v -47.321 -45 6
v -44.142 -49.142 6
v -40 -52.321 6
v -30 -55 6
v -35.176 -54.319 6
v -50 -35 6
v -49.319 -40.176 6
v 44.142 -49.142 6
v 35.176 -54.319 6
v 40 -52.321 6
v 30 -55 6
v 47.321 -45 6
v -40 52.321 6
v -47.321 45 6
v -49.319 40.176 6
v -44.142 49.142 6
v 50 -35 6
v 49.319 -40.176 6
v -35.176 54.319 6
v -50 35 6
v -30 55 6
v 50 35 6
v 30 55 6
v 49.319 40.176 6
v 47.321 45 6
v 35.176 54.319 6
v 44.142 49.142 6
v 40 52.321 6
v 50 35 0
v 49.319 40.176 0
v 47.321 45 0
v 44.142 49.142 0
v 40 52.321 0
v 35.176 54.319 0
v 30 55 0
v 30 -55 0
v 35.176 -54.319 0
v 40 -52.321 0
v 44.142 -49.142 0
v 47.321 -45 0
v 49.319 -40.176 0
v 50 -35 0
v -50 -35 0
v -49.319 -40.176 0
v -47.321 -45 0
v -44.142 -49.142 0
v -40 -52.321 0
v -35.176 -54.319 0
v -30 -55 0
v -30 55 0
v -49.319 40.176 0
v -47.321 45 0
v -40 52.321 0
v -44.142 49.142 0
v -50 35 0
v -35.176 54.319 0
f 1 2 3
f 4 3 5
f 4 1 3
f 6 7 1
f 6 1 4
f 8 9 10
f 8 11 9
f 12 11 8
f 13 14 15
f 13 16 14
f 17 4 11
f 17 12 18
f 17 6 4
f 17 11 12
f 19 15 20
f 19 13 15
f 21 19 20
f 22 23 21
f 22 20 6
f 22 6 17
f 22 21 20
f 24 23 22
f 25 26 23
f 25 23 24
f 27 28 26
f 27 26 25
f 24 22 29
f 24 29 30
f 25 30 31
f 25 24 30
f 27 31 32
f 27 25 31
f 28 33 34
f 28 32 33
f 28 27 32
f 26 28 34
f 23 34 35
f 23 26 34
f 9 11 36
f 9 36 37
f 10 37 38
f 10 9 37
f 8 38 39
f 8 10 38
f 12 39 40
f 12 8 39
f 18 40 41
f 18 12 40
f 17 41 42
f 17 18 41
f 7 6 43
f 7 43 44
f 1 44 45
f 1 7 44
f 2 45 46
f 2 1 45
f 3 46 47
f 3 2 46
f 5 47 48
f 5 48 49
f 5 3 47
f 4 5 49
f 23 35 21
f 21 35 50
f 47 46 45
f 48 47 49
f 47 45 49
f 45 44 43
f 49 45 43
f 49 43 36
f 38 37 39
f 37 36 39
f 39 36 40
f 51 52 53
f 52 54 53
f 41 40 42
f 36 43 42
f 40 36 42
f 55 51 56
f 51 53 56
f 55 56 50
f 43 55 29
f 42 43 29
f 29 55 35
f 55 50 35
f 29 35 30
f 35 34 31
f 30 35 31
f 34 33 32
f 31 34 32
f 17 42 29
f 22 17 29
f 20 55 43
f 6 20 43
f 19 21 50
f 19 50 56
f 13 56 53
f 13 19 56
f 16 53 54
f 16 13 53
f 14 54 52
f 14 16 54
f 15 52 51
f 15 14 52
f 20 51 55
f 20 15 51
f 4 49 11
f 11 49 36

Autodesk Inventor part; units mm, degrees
ref_plane "YZ Plane" through (0, 0, 0) normal (1, 0, 0) x (0, 1, 0)
ref_plane "XZ Plane" through (0, 0, 0) normal (0, 1, 0) x (-1, 0, 0)
ref_plane "XY Plane" through (0, 0, 0) normal (0, 0, 1) x (1, 0, 0)
sketch "Sketch1" plane through (0, 0, 0) normal (0, 0, 1) x (1, 0, 0)
  line L0 (-50, -55) -> (50, -55)
  line L1 (50, -55) -> (50, 55)
  line L2 (50, 55) -> (-50, 55)
  line L3 (-50, 55) -> (-50, -55)
  line L4 (-50, -55) -> (50, 55) construction
  line L5 (50, -55) -> (-50, 55) construction
  point P0 (0, 0)
  dimension "d0" = 100
  dimension "d1" = 110
extrude "Plate1" add sketch "Sketch1" along normal blind 6
fillet "Corner Round1" radius 20 4 edges at (50, -55, 3) (-50, -55, 3) (-50, 55, 3) (50, 55, 3)
sketch "Sketch5" plane through (0, 0, 6) normal (0, 0, 1) x (1, 0, 0)
  line L0 (50, 35) -> (50, -35) projected
  line L1 (50, 25) -> (-50, 25)
  line L2 (-50, -35) -> (-50, 35) projected
  line L3 (-30, 55) -> (30, 55) projected
  point P0 (0, 0)
  dimension "d23" = 30
feature "Fold1" [suppressed]
equation "\"d2\" = Thickness"
equation "\"d24\" = BendReliefWidth"
equation "\"d25\" = BendReliefDepth"
equation "\"d26\" = MinimumRemnant"
equation "\"d27\" = TransitionRadius"
equation "\"d29\" = BendRadius"
equation "\"BendReliefWidth\" = Thickness"
equation "\"BendReliefDepth\" = 0.5 * Thickness"
equation "\"CornerReliefSize\" = 4 * Thickness"
equation "\"MinimumRemnant\" = 2 * Thickness"
equation "\"TransitionRadius\" = BendRadius"
equation "\"JacobiRadiusSize\" = BendRadius"
equation "\"GapSize\" = Thickness"
equation "\"Thickness\" = 6"
equation "\"BendRadius\" = 5"
properties part number "PRS 940-93 leg plate for filter" material "Stainless Steel"
